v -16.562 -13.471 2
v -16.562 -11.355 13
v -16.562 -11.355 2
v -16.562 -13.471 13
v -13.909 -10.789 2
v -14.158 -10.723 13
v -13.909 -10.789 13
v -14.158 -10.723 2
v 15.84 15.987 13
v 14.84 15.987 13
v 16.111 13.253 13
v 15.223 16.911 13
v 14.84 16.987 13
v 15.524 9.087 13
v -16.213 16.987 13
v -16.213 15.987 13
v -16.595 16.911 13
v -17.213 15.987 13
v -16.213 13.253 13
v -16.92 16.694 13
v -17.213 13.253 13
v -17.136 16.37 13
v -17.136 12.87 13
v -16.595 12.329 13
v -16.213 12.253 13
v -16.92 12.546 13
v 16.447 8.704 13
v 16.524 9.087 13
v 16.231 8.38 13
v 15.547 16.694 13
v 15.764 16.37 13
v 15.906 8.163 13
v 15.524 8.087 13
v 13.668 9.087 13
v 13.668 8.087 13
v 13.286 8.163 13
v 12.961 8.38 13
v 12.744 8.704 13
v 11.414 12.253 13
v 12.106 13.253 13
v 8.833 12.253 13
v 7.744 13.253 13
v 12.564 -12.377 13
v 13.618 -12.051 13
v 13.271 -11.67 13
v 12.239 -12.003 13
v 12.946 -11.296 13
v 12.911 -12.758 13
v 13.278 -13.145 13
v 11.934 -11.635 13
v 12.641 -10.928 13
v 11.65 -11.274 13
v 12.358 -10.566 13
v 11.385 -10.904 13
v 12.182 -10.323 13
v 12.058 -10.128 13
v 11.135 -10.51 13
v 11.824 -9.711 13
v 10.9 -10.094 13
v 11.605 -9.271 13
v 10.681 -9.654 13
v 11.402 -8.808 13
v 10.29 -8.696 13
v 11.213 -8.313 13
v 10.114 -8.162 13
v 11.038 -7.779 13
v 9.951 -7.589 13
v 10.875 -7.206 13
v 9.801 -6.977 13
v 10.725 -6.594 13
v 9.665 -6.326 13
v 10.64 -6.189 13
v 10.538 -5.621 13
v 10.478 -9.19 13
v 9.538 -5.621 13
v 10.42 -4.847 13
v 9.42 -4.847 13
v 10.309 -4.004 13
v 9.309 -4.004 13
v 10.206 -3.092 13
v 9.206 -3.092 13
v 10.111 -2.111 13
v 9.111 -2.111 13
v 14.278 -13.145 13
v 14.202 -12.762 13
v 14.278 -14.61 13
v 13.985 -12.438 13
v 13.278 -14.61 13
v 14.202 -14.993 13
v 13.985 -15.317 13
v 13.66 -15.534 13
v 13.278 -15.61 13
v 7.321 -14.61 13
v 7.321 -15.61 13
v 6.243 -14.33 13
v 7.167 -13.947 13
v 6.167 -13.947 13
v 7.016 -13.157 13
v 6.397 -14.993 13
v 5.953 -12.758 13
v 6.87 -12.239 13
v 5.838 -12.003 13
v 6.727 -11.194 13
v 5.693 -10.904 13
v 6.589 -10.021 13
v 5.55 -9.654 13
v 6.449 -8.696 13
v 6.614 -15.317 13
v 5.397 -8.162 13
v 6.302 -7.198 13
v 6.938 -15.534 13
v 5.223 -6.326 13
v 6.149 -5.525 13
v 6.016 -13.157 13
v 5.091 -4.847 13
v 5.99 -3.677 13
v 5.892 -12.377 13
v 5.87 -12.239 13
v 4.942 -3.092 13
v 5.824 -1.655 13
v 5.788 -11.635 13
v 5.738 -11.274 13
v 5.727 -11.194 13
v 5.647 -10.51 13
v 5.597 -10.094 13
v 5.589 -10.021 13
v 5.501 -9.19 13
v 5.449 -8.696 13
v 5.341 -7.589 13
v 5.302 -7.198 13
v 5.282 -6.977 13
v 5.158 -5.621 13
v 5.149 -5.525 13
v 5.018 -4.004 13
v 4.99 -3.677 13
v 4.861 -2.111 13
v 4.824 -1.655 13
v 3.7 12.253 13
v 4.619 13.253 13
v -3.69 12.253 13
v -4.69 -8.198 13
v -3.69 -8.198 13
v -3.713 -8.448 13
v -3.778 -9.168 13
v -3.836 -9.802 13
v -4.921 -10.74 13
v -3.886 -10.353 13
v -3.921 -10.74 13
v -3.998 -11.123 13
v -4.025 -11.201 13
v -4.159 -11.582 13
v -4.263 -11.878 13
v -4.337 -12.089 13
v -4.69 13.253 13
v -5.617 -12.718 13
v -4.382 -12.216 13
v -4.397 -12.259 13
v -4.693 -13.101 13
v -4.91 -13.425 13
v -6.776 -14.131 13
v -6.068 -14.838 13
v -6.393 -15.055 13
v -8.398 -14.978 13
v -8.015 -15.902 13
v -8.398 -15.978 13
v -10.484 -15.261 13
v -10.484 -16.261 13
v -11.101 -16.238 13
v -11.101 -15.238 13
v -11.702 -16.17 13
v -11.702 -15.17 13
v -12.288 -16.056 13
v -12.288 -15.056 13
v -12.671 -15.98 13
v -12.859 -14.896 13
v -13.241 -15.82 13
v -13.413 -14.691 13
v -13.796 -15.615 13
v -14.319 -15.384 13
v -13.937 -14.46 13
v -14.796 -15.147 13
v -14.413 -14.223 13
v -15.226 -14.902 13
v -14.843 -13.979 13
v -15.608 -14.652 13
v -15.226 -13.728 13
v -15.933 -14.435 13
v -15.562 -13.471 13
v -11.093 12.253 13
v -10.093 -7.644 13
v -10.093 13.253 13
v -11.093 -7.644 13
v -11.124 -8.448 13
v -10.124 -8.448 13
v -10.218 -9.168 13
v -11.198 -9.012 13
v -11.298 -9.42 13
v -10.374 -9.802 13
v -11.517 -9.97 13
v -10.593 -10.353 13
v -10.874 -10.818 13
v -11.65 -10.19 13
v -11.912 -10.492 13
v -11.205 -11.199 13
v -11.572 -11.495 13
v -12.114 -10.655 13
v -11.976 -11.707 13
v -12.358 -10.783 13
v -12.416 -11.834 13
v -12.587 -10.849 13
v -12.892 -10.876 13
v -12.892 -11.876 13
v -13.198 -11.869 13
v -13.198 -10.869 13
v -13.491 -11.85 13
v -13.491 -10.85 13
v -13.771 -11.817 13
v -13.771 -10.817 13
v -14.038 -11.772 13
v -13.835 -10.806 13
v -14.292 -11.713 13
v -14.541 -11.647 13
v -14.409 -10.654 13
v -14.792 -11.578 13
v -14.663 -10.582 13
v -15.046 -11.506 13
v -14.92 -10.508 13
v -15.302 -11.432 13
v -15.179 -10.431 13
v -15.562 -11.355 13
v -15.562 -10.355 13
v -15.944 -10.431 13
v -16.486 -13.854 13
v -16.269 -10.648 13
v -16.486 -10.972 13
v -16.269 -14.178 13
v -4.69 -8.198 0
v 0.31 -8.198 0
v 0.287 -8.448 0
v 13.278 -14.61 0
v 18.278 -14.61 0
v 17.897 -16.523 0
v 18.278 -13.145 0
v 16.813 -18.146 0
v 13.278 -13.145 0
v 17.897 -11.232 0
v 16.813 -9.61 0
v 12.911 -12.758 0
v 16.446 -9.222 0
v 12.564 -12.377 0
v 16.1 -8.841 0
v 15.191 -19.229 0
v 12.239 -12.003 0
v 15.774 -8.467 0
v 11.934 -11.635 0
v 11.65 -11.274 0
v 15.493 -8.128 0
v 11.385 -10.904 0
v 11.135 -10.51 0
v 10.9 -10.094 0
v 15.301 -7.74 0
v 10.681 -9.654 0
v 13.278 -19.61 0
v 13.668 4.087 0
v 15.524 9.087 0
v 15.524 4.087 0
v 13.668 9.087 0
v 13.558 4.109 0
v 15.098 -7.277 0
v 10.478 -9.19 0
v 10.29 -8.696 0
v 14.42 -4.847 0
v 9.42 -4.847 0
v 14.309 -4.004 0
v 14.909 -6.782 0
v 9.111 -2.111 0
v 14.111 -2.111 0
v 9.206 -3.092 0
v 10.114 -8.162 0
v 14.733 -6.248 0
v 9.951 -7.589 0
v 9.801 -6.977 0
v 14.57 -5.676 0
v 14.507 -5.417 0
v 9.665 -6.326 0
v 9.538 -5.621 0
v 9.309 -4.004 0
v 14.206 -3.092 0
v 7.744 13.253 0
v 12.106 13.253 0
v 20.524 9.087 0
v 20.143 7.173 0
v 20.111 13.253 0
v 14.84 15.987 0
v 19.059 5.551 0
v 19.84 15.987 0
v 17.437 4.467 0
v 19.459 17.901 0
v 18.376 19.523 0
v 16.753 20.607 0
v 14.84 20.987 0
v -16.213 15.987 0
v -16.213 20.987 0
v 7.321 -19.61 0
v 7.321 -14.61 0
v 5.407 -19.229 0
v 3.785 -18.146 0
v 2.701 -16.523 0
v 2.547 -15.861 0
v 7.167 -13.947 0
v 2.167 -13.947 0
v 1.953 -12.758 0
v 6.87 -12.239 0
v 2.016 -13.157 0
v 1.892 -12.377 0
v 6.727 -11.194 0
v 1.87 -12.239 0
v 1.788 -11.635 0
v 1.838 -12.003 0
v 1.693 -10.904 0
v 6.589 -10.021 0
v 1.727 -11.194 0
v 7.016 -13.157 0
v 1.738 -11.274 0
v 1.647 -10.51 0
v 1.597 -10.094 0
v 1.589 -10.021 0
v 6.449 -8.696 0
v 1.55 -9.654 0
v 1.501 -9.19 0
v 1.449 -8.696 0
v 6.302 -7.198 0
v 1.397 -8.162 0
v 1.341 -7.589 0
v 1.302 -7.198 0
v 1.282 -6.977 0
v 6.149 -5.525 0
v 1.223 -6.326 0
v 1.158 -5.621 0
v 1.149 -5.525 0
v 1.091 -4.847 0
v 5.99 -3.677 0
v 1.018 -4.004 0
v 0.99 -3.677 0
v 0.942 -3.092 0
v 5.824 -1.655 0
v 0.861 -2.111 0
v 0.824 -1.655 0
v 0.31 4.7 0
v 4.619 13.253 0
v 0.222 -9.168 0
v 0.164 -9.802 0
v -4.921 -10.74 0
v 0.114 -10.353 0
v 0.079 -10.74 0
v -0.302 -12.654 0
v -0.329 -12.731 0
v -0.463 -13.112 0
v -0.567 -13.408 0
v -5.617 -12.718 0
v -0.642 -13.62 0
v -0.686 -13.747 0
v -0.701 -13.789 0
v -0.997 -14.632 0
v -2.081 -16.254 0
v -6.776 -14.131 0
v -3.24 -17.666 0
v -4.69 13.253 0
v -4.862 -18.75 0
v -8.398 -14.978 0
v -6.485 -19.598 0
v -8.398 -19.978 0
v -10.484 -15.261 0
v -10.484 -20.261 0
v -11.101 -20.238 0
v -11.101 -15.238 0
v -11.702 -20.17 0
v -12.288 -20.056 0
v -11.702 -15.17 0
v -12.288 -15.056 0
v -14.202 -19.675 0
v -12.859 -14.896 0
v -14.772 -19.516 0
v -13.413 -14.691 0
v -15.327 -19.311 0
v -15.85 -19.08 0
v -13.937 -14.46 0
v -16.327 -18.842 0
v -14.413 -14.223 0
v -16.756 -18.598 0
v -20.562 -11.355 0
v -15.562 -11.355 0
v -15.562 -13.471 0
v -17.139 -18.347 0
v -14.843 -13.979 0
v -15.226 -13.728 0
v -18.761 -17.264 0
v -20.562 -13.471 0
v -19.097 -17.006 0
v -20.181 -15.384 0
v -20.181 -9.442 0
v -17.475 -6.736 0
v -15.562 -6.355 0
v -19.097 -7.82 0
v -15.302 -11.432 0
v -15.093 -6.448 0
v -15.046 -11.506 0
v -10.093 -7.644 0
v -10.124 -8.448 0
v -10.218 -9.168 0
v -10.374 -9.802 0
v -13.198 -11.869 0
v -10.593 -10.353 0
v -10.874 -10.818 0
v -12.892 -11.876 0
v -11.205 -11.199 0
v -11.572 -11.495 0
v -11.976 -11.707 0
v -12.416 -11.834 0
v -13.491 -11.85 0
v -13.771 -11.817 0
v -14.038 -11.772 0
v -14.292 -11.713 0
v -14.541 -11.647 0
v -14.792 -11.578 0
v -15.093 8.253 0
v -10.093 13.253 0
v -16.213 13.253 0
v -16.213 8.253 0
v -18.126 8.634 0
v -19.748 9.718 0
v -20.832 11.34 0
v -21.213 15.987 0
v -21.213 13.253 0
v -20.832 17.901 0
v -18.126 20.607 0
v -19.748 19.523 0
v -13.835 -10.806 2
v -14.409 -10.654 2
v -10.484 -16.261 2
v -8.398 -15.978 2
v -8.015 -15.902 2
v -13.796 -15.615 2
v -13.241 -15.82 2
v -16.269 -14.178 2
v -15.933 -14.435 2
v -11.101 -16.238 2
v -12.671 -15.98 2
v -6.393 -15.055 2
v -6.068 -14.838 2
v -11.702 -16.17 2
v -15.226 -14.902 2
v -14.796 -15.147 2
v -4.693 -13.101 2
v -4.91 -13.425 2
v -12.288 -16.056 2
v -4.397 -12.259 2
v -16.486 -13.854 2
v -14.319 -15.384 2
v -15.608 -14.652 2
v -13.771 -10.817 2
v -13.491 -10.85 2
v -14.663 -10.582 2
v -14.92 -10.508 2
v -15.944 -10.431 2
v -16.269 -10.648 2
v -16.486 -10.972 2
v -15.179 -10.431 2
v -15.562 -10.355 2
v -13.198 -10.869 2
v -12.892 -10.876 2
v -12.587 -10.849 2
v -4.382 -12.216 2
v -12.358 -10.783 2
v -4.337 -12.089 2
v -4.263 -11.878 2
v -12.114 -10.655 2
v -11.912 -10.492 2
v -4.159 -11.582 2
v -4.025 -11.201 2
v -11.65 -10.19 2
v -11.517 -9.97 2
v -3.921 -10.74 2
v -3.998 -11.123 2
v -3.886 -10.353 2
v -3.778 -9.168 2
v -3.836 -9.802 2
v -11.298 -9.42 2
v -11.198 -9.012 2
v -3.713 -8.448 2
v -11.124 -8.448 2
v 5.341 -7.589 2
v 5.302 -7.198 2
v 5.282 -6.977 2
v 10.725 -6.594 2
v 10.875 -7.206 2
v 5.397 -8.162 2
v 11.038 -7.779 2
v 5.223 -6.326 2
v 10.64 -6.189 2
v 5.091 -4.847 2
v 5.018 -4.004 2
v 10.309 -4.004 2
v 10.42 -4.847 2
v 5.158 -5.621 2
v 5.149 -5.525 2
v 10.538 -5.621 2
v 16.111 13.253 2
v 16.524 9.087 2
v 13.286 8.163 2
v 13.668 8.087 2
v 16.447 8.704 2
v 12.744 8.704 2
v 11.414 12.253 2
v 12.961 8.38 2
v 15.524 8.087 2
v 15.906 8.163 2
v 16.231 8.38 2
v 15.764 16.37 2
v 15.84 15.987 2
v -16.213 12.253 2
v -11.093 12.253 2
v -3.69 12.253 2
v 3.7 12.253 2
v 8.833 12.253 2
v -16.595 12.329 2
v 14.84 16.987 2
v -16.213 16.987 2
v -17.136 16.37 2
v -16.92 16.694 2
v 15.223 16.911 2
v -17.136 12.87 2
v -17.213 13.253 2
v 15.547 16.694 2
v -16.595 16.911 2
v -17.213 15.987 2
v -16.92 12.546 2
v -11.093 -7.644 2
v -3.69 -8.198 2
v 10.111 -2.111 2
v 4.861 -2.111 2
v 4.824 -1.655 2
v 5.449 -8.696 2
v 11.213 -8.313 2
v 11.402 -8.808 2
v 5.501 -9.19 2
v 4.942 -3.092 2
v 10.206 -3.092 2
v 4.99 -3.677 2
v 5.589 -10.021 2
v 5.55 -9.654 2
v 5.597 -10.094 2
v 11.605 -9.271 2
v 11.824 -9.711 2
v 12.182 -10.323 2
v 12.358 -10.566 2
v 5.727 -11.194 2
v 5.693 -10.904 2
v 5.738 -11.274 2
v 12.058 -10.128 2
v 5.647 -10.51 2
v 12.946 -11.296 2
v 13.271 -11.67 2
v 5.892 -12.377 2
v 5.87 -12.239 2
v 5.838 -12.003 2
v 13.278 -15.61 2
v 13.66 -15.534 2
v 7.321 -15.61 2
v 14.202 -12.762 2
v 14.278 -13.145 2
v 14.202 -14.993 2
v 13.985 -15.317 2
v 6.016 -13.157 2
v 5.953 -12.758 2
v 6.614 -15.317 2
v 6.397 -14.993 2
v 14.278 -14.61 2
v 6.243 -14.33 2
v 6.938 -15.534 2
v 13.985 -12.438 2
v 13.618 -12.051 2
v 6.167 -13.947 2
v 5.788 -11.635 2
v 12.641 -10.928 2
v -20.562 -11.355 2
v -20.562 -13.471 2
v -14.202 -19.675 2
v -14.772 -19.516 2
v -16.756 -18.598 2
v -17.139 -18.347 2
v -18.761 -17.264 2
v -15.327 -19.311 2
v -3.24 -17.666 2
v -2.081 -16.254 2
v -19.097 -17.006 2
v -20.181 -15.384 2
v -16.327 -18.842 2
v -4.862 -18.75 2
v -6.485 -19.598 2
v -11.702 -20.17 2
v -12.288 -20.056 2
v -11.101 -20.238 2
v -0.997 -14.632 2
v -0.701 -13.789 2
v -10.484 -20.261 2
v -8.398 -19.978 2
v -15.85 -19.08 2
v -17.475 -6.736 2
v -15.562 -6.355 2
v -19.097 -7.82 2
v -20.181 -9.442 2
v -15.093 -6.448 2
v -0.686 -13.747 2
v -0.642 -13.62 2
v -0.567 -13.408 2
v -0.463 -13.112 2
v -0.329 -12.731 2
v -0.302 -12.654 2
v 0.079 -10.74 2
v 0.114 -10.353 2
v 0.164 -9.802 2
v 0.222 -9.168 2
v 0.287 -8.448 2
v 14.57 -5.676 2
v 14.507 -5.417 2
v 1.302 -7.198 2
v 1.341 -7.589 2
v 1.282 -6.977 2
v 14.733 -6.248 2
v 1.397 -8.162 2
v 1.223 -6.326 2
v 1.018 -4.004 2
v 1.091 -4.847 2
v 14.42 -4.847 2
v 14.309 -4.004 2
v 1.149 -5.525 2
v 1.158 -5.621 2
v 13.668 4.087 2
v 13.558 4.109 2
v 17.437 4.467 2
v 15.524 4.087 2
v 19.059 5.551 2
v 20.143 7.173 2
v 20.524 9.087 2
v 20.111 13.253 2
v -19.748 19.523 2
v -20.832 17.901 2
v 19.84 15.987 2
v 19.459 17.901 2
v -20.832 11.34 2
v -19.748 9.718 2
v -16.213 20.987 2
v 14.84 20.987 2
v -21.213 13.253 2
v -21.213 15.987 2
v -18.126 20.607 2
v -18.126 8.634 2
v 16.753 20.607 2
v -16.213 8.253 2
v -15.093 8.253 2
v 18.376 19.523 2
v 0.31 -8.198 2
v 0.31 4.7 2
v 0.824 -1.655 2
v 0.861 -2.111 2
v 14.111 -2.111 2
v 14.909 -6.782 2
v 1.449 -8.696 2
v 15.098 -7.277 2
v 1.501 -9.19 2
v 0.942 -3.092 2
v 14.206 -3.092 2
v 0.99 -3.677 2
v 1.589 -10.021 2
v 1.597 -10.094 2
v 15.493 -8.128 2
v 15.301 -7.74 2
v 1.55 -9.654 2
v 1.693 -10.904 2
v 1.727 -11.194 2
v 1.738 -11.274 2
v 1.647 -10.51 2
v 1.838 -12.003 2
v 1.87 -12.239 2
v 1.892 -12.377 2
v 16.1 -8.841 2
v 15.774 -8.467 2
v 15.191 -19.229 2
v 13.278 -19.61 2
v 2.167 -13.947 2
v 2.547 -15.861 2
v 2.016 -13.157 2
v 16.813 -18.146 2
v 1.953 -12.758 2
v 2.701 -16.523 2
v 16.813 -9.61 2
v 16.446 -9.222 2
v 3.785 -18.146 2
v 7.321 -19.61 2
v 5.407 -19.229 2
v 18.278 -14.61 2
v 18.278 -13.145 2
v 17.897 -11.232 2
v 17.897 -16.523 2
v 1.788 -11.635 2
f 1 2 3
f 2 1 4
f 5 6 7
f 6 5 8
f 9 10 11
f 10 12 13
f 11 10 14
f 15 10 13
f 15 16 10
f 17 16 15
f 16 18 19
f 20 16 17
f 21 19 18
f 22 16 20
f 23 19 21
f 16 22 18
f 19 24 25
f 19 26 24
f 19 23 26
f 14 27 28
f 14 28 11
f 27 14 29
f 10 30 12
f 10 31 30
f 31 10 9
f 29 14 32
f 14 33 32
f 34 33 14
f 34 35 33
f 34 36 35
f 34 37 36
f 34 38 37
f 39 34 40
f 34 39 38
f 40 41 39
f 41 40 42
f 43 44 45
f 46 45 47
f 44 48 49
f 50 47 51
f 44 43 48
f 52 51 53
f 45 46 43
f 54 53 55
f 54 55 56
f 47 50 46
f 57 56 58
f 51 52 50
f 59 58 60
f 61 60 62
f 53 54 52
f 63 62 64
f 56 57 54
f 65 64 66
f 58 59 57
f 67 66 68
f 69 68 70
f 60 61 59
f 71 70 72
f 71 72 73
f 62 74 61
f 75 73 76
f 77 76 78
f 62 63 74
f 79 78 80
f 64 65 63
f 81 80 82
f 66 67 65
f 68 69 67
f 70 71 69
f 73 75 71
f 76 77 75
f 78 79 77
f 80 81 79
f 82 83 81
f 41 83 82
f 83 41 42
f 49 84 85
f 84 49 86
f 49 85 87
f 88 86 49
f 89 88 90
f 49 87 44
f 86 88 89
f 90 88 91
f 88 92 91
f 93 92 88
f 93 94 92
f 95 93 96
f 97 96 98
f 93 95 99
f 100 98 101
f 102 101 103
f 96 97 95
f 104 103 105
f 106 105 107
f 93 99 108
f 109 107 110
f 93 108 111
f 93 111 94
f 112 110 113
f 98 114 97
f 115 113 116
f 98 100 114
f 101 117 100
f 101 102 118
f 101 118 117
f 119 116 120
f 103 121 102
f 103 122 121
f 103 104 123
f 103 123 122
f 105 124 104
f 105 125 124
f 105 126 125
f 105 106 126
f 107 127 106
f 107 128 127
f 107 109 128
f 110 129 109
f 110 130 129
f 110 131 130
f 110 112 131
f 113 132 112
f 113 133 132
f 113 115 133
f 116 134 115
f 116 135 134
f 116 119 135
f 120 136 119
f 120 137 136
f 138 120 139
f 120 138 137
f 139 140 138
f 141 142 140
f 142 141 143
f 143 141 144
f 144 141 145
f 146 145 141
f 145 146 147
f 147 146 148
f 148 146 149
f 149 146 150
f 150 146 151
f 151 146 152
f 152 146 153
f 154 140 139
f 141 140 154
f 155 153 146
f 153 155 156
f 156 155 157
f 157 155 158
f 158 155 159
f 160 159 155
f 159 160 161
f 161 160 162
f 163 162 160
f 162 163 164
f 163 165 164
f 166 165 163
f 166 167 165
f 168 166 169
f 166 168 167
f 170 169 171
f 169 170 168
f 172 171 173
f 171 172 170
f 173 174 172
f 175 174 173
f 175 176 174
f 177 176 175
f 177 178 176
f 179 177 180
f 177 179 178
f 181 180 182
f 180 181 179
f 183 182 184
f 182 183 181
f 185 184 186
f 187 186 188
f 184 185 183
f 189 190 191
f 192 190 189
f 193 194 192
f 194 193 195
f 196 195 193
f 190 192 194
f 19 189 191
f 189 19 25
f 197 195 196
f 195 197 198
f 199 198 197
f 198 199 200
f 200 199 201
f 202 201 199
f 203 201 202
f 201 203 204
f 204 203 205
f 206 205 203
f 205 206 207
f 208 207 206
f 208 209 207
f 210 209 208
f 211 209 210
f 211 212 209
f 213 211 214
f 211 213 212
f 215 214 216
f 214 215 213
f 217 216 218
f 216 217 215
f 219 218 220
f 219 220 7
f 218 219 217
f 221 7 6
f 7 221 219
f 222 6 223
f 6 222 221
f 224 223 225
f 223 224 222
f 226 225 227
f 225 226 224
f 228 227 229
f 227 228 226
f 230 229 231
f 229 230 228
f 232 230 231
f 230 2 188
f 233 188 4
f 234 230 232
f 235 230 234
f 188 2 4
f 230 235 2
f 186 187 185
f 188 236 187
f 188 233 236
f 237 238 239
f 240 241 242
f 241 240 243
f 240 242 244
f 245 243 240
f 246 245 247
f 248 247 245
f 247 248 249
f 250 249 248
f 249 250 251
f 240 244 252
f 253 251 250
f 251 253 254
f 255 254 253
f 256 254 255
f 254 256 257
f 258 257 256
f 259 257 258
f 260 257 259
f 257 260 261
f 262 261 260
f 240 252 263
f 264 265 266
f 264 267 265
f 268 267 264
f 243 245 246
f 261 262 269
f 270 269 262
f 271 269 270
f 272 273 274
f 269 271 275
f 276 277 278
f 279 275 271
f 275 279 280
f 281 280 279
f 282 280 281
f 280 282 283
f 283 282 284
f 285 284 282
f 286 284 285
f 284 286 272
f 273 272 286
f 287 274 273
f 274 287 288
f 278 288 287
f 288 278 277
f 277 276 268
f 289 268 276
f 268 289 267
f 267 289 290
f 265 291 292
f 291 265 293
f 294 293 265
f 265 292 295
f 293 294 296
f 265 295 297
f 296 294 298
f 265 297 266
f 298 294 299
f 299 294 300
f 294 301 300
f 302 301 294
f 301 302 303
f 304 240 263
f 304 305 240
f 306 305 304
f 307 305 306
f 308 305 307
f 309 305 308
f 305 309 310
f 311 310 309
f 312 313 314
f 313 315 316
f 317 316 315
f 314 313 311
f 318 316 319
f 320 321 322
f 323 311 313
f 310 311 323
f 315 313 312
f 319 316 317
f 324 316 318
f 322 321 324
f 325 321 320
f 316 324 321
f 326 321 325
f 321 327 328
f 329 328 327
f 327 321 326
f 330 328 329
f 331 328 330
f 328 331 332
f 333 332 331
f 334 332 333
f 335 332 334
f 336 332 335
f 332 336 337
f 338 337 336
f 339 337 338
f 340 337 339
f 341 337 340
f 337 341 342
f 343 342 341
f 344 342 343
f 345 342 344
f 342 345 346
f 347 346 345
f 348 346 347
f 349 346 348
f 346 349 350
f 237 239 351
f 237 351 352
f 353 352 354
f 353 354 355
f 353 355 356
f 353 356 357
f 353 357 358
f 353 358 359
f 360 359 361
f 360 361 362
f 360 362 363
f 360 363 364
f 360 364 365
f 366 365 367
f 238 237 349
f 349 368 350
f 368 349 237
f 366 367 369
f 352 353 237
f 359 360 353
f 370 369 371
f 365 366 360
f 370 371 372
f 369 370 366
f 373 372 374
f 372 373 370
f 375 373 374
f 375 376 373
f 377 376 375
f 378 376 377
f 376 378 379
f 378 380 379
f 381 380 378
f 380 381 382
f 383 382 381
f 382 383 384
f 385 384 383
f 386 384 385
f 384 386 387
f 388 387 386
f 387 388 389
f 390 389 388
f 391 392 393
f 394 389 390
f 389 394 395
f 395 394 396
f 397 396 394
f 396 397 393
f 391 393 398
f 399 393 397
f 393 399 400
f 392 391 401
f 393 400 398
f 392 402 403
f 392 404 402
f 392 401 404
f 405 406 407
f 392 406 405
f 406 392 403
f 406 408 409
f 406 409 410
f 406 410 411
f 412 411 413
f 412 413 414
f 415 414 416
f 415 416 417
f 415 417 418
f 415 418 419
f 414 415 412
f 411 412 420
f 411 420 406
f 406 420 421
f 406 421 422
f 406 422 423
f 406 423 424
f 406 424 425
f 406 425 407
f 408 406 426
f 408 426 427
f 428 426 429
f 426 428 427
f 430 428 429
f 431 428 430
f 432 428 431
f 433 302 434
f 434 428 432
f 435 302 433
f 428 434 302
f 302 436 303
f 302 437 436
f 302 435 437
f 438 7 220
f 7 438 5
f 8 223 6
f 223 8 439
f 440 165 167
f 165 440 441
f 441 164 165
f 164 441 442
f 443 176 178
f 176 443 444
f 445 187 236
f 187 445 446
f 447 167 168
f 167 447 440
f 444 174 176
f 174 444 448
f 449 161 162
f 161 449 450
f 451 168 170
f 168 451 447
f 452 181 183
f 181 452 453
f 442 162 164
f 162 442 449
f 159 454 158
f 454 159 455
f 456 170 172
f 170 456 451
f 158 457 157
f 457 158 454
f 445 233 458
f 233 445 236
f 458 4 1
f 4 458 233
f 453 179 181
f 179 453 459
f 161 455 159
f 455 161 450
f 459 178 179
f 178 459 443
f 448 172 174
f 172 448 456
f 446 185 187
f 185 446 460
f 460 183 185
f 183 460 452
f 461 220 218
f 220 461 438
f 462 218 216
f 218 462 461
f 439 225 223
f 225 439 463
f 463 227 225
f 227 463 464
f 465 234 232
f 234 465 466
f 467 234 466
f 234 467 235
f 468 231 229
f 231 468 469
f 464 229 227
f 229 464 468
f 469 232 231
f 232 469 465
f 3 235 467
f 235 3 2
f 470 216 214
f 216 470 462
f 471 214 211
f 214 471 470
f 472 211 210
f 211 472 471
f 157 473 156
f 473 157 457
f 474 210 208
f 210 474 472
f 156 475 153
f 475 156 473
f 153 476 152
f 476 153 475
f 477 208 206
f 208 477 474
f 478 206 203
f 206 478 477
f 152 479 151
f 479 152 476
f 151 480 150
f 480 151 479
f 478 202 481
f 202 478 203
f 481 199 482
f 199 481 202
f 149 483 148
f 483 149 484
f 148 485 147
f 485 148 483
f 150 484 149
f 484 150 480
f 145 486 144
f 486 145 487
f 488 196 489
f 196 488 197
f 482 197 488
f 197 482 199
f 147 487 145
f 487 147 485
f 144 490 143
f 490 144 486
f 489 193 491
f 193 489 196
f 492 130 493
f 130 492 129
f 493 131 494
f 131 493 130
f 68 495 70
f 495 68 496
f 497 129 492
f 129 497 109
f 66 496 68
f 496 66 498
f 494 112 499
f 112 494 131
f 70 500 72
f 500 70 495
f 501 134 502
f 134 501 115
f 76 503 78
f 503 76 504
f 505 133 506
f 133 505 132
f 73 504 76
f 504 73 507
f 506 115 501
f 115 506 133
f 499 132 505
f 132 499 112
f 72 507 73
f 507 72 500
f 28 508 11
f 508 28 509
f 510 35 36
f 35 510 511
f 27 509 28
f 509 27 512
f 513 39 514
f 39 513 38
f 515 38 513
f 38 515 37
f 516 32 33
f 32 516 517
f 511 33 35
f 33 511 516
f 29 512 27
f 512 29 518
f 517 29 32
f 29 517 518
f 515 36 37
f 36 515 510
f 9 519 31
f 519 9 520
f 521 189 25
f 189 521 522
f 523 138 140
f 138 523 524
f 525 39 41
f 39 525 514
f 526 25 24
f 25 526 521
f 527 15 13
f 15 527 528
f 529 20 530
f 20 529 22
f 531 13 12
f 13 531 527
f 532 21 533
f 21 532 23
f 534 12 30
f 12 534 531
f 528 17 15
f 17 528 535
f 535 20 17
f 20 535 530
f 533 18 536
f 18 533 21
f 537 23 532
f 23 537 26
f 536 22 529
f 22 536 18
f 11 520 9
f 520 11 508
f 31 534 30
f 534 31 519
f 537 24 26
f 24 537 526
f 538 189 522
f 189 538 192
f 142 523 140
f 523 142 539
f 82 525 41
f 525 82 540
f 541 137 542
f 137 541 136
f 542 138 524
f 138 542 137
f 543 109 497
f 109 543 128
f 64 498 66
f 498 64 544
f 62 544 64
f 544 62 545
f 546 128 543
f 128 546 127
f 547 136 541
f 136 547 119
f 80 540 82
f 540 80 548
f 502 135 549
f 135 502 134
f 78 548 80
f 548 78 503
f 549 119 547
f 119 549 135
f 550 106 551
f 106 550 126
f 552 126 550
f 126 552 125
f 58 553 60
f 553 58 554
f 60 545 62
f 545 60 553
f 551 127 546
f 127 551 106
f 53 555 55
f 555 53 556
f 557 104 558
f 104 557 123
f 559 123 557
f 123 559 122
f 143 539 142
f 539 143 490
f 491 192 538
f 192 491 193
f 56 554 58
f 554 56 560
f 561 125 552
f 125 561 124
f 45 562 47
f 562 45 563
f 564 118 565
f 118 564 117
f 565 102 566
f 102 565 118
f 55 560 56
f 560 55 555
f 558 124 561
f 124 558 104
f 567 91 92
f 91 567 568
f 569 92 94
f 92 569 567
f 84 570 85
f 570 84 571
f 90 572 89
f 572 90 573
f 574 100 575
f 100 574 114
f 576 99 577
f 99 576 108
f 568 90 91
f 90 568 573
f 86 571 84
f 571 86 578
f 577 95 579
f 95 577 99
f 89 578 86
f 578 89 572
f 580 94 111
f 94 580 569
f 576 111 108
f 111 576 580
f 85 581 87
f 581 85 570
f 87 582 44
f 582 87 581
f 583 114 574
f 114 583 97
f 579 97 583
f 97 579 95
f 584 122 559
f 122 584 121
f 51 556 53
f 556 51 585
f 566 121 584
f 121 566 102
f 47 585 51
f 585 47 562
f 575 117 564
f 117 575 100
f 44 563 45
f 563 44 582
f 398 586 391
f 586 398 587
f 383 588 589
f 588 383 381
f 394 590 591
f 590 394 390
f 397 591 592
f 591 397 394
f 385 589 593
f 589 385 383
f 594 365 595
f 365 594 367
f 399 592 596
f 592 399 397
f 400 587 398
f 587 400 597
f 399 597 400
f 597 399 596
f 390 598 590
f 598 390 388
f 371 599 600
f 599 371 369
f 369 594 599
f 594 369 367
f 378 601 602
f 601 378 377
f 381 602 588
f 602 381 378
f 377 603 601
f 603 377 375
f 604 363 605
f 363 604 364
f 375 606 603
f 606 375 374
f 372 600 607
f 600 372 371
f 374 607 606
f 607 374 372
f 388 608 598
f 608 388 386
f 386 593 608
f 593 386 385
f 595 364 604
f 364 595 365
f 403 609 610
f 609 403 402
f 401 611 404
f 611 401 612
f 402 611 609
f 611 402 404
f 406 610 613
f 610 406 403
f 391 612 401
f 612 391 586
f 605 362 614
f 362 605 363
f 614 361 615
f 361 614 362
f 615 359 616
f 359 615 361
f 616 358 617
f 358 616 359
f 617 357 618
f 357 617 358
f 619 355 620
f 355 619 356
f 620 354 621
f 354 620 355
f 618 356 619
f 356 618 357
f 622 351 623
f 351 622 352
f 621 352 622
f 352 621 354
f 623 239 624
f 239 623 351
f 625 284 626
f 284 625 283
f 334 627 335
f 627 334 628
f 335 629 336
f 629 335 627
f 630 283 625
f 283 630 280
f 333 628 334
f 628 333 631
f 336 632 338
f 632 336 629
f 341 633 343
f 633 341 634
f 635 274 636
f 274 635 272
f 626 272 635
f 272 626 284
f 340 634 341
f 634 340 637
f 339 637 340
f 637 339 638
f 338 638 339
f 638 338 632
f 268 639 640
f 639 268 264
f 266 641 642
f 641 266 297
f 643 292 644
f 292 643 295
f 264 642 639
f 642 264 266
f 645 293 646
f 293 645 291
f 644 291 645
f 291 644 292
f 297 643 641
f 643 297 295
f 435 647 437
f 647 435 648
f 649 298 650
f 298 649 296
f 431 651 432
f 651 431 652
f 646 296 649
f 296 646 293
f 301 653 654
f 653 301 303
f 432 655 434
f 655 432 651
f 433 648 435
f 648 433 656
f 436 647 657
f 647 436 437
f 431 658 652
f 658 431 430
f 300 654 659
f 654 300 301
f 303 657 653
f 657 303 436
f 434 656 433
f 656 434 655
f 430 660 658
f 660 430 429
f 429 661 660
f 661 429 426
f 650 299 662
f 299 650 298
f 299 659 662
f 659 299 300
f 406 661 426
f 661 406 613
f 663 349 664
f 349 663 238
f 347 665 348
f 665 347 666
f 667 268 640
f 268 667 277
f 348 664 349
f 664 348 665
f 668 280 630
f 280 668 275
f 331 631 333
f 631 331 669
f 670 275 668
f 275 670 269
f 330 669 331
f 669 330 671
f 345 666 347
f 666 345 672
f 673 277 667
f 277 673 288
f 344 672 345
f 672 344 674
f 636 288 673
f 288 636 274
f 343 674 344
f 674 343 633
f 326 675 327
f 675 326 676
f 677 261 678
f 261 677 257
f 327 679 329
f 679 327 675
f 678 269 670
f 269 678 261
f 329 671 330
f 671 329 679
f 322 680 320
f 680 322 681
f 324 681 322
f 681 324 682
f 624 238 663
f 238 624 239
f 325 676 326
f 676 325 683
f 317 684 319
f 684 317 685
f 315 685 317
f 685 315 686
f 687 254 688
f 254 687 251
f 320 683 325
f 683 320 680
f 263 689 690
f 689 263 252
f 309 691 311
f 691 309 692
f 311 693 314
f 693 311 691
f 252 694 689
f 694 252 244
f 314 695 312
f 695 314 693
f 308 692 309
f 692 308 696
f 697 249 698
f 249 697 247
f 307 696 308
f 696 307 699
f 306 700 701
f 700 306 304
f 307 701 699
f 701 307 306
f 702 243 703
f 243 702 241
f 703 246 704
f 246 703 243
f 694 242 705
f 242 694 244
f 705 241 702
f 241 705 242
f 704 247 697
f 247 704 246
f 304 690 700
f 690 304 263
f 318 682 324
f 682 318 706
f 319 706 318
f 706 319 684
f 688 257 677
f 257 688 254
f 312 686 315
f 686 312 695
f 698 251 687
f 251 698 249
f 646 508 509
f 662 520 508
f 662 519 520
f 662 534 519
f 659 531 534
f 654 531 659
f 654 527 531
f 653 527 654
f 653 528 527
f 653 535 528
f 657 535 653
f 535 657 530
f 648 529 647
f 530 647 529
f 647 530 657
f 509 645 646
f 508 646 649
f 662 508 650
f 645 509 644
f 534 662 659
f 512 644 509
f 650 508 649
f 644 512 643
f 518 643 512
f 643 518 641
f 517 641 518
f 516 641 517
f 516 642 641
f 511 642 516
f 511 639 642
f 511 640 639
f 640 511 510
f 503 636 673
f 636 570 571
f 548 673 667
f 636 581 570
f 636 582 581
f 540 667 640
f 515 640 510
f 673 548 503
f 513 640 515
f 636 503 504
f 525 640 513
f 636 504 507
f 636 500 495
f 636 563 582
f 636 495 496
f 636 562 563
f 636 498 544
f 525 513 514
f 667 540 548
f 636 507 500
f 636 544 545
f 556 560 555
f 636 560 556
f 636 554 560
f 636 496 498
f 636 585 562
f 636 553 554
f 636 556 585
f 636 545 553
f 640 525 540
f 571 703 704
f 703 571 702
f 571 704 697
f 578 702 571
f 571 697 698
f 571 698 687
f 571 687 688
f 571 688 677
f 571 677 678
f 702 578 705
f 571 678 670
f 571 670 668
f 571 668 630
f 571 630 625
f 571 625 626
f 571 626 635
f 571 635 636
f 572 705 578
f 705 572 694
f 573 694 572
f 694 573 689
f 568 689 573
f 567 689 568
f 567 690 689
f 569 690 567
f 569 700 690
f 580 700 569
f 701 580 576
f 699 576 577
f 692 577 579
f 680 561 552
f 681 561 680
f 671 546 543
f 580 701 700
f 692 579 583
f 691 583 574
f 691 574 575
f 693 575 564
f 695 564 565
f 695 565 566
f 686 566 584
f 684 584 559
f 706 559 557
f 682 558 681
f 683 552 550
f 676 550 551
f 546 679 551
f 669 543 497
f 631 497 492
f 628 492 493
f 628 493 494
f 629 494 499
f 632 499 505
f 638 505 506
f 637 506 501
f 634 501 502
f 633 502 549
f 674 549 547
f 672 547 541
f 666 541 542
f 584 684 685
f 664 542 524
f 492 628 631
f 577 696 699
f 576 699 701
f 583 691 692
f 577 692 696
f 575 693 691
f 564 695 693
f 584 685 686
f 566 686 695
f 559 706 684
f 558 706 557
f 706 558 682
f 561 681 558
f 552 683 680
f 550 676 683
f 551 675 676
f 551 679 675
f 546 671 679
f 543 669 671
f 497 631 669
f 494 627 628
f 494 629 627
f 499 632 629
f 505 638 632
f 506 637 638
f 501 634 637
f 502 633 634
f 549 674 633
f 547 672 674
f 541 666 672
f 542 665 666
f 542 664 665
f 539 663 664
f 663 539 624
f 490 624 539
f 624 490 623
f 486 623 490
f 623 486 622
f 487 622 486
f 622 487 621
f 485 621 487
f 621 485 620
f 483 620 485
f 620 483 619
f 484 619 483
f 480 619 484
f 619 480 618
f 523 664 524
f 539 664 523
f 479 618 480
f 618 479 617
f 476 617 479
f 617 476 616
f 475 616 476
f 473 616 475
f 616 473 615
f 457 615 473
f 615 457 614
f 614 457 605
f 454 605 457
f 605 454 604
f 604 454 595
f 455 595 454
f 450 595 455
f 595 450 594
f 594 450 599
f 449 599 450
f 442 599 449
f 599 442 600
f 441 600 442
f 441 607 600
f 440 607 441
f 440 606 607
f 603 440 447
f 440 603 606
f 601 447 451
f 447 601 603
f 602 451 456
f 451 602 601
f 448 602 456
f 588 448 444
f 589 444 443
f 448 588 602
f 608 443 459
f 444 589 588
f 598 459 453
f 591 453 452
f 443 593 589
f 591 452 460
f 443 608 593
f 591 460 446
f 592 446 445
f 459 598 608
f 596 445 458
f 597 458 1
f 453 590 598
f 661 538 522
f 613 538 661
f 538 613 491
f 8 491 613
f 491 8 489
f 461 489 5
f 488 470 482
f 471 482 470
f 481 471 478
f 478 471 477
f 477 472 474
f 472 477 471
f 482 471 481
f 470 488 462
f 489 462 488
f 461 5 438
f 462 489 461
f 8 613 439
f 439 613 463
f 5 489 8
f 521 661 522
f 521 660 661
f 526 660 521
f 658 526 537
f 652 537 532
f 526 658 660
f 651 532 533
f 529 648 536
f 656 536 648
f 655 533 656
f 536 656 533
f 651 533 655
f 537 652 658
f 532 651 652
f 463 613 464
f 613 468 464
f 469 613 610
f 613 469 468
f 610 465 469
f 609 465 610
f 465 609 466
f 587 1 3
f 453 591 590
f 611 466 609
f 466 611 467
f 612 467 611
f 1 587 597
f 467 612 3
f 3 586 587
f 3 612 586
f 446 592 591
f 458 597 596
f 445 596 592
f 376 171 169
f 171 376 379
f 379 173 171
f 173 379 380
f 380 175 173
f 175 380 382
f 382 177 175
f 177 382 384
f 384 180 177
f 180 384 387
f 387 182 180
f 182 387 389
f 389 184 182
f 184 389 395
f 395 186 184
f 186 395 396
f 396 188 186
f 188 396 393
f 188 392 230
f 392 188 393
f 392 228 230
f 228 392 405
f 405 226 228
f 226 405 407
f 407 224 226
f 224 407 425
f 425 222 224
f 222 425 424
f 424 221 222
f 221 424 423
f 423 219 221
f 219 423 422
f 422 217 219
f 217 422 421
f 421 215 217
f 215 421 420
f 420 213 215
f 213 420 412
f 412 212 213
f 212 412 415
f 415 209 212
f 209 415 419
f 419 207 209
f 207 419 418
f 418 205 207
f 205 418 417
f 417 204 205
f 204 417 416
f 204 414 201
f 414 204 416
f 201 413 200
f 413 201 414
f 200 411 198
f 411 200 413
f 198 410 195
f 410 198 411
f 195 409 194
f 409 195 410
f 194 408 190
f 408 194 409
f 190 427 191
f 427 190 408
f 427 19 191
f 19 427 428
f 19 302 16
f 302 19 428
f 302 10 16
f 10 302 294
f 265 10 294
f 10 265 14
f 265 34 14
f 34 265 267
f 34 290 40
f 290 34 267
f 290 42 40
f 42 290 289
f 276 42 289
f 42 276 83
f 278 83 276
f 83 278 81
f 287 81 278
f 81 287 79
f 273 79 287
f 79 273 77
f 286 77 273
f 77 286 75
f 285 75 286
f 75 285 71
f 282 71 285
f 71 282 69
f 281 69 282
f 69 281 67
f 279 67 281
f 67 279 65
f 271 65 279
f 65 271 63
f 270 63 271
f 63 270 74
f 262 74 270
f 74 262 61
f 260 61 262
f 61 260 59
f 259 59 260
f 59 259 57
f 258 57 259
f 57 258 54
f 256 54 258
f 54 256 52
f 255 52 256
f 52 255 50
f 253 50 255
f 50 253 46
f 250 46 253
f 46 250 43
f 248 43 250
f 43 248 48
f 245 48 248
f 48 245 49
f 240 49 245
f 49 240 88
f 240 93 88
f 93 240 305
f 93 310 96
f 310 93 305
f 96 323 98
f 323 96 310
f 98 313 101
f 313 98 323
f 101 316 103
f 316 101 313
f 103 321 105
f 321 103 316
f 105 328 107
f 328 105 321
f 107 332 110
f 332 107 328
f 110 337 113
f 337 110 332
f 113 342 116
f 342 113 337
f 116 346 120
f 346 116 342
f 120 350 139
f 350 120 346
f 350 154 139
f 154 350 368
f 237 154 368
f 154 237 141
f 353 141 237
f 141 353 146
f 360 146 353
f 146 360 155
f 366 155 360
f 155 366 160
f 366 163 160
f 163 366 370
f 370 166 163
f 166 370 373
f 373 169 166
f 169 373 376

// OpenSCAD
// The symbol to make a cookie cutter. 
// You can copy/paste from a text editor. Any symbol from the font allowed (e.g. "∫∞∑Ω℮π→")
text="π";
// Put 1 if you want to have supporting lines for the inner holes.
// It is necessary for symbols like 'o', 'a'. Symbols without inner holes don't need it ('s', 't',...)
lines=0;
// Angle of the supporting lines
lines_angle=45;

// The font you want to use. You can change style like that: "Times New Roman:style=Bold". There are a lot of fancy symbols in the "Symbol" font.
font = "Times New Roman";

// The letter size. If you have a problem cutting dough, use larger font.
letter_size = 48;

module solid()
mirror([1,0,0])
linear_extrude(height = 5, convexity = 10) {
projection(cut=false) 
letter(text);
}

$fn=16;

module letter(l) {
    linear_extrude(height = 1, convexity = 10) {
   
        text(l, size = letter_size, font = font, halign = "center", valign = "center", $fn = 32);
    }
}

module OuterShape()
        minkowski()
        {
            solid();
            cylinder(d=2, h=8);
        }


module Cutter()
difference()
{
    union()
    {
        OuterShape();
        intersection()
        {
            scale([500,500,4])
            cube(1, center=true);
            
            minkowski()
            {
                solid();
                //sphere(1);
                cylinder(d=10, h=2);
            }
        }    
    }
    translate([0,0,-5])
    scale([1,1,20])
    solid();
}

module Lines()
{
    intersection()
    {
        rotate([0,0,lines_angle])
        for(i=[-50:15:50])
        translate([-200,i,0])
        scale([400,3,2])
        cube(1);
        
        OuterShape();
    }
}

if(lines==1)
{
    Lines();
}
Cutter();
